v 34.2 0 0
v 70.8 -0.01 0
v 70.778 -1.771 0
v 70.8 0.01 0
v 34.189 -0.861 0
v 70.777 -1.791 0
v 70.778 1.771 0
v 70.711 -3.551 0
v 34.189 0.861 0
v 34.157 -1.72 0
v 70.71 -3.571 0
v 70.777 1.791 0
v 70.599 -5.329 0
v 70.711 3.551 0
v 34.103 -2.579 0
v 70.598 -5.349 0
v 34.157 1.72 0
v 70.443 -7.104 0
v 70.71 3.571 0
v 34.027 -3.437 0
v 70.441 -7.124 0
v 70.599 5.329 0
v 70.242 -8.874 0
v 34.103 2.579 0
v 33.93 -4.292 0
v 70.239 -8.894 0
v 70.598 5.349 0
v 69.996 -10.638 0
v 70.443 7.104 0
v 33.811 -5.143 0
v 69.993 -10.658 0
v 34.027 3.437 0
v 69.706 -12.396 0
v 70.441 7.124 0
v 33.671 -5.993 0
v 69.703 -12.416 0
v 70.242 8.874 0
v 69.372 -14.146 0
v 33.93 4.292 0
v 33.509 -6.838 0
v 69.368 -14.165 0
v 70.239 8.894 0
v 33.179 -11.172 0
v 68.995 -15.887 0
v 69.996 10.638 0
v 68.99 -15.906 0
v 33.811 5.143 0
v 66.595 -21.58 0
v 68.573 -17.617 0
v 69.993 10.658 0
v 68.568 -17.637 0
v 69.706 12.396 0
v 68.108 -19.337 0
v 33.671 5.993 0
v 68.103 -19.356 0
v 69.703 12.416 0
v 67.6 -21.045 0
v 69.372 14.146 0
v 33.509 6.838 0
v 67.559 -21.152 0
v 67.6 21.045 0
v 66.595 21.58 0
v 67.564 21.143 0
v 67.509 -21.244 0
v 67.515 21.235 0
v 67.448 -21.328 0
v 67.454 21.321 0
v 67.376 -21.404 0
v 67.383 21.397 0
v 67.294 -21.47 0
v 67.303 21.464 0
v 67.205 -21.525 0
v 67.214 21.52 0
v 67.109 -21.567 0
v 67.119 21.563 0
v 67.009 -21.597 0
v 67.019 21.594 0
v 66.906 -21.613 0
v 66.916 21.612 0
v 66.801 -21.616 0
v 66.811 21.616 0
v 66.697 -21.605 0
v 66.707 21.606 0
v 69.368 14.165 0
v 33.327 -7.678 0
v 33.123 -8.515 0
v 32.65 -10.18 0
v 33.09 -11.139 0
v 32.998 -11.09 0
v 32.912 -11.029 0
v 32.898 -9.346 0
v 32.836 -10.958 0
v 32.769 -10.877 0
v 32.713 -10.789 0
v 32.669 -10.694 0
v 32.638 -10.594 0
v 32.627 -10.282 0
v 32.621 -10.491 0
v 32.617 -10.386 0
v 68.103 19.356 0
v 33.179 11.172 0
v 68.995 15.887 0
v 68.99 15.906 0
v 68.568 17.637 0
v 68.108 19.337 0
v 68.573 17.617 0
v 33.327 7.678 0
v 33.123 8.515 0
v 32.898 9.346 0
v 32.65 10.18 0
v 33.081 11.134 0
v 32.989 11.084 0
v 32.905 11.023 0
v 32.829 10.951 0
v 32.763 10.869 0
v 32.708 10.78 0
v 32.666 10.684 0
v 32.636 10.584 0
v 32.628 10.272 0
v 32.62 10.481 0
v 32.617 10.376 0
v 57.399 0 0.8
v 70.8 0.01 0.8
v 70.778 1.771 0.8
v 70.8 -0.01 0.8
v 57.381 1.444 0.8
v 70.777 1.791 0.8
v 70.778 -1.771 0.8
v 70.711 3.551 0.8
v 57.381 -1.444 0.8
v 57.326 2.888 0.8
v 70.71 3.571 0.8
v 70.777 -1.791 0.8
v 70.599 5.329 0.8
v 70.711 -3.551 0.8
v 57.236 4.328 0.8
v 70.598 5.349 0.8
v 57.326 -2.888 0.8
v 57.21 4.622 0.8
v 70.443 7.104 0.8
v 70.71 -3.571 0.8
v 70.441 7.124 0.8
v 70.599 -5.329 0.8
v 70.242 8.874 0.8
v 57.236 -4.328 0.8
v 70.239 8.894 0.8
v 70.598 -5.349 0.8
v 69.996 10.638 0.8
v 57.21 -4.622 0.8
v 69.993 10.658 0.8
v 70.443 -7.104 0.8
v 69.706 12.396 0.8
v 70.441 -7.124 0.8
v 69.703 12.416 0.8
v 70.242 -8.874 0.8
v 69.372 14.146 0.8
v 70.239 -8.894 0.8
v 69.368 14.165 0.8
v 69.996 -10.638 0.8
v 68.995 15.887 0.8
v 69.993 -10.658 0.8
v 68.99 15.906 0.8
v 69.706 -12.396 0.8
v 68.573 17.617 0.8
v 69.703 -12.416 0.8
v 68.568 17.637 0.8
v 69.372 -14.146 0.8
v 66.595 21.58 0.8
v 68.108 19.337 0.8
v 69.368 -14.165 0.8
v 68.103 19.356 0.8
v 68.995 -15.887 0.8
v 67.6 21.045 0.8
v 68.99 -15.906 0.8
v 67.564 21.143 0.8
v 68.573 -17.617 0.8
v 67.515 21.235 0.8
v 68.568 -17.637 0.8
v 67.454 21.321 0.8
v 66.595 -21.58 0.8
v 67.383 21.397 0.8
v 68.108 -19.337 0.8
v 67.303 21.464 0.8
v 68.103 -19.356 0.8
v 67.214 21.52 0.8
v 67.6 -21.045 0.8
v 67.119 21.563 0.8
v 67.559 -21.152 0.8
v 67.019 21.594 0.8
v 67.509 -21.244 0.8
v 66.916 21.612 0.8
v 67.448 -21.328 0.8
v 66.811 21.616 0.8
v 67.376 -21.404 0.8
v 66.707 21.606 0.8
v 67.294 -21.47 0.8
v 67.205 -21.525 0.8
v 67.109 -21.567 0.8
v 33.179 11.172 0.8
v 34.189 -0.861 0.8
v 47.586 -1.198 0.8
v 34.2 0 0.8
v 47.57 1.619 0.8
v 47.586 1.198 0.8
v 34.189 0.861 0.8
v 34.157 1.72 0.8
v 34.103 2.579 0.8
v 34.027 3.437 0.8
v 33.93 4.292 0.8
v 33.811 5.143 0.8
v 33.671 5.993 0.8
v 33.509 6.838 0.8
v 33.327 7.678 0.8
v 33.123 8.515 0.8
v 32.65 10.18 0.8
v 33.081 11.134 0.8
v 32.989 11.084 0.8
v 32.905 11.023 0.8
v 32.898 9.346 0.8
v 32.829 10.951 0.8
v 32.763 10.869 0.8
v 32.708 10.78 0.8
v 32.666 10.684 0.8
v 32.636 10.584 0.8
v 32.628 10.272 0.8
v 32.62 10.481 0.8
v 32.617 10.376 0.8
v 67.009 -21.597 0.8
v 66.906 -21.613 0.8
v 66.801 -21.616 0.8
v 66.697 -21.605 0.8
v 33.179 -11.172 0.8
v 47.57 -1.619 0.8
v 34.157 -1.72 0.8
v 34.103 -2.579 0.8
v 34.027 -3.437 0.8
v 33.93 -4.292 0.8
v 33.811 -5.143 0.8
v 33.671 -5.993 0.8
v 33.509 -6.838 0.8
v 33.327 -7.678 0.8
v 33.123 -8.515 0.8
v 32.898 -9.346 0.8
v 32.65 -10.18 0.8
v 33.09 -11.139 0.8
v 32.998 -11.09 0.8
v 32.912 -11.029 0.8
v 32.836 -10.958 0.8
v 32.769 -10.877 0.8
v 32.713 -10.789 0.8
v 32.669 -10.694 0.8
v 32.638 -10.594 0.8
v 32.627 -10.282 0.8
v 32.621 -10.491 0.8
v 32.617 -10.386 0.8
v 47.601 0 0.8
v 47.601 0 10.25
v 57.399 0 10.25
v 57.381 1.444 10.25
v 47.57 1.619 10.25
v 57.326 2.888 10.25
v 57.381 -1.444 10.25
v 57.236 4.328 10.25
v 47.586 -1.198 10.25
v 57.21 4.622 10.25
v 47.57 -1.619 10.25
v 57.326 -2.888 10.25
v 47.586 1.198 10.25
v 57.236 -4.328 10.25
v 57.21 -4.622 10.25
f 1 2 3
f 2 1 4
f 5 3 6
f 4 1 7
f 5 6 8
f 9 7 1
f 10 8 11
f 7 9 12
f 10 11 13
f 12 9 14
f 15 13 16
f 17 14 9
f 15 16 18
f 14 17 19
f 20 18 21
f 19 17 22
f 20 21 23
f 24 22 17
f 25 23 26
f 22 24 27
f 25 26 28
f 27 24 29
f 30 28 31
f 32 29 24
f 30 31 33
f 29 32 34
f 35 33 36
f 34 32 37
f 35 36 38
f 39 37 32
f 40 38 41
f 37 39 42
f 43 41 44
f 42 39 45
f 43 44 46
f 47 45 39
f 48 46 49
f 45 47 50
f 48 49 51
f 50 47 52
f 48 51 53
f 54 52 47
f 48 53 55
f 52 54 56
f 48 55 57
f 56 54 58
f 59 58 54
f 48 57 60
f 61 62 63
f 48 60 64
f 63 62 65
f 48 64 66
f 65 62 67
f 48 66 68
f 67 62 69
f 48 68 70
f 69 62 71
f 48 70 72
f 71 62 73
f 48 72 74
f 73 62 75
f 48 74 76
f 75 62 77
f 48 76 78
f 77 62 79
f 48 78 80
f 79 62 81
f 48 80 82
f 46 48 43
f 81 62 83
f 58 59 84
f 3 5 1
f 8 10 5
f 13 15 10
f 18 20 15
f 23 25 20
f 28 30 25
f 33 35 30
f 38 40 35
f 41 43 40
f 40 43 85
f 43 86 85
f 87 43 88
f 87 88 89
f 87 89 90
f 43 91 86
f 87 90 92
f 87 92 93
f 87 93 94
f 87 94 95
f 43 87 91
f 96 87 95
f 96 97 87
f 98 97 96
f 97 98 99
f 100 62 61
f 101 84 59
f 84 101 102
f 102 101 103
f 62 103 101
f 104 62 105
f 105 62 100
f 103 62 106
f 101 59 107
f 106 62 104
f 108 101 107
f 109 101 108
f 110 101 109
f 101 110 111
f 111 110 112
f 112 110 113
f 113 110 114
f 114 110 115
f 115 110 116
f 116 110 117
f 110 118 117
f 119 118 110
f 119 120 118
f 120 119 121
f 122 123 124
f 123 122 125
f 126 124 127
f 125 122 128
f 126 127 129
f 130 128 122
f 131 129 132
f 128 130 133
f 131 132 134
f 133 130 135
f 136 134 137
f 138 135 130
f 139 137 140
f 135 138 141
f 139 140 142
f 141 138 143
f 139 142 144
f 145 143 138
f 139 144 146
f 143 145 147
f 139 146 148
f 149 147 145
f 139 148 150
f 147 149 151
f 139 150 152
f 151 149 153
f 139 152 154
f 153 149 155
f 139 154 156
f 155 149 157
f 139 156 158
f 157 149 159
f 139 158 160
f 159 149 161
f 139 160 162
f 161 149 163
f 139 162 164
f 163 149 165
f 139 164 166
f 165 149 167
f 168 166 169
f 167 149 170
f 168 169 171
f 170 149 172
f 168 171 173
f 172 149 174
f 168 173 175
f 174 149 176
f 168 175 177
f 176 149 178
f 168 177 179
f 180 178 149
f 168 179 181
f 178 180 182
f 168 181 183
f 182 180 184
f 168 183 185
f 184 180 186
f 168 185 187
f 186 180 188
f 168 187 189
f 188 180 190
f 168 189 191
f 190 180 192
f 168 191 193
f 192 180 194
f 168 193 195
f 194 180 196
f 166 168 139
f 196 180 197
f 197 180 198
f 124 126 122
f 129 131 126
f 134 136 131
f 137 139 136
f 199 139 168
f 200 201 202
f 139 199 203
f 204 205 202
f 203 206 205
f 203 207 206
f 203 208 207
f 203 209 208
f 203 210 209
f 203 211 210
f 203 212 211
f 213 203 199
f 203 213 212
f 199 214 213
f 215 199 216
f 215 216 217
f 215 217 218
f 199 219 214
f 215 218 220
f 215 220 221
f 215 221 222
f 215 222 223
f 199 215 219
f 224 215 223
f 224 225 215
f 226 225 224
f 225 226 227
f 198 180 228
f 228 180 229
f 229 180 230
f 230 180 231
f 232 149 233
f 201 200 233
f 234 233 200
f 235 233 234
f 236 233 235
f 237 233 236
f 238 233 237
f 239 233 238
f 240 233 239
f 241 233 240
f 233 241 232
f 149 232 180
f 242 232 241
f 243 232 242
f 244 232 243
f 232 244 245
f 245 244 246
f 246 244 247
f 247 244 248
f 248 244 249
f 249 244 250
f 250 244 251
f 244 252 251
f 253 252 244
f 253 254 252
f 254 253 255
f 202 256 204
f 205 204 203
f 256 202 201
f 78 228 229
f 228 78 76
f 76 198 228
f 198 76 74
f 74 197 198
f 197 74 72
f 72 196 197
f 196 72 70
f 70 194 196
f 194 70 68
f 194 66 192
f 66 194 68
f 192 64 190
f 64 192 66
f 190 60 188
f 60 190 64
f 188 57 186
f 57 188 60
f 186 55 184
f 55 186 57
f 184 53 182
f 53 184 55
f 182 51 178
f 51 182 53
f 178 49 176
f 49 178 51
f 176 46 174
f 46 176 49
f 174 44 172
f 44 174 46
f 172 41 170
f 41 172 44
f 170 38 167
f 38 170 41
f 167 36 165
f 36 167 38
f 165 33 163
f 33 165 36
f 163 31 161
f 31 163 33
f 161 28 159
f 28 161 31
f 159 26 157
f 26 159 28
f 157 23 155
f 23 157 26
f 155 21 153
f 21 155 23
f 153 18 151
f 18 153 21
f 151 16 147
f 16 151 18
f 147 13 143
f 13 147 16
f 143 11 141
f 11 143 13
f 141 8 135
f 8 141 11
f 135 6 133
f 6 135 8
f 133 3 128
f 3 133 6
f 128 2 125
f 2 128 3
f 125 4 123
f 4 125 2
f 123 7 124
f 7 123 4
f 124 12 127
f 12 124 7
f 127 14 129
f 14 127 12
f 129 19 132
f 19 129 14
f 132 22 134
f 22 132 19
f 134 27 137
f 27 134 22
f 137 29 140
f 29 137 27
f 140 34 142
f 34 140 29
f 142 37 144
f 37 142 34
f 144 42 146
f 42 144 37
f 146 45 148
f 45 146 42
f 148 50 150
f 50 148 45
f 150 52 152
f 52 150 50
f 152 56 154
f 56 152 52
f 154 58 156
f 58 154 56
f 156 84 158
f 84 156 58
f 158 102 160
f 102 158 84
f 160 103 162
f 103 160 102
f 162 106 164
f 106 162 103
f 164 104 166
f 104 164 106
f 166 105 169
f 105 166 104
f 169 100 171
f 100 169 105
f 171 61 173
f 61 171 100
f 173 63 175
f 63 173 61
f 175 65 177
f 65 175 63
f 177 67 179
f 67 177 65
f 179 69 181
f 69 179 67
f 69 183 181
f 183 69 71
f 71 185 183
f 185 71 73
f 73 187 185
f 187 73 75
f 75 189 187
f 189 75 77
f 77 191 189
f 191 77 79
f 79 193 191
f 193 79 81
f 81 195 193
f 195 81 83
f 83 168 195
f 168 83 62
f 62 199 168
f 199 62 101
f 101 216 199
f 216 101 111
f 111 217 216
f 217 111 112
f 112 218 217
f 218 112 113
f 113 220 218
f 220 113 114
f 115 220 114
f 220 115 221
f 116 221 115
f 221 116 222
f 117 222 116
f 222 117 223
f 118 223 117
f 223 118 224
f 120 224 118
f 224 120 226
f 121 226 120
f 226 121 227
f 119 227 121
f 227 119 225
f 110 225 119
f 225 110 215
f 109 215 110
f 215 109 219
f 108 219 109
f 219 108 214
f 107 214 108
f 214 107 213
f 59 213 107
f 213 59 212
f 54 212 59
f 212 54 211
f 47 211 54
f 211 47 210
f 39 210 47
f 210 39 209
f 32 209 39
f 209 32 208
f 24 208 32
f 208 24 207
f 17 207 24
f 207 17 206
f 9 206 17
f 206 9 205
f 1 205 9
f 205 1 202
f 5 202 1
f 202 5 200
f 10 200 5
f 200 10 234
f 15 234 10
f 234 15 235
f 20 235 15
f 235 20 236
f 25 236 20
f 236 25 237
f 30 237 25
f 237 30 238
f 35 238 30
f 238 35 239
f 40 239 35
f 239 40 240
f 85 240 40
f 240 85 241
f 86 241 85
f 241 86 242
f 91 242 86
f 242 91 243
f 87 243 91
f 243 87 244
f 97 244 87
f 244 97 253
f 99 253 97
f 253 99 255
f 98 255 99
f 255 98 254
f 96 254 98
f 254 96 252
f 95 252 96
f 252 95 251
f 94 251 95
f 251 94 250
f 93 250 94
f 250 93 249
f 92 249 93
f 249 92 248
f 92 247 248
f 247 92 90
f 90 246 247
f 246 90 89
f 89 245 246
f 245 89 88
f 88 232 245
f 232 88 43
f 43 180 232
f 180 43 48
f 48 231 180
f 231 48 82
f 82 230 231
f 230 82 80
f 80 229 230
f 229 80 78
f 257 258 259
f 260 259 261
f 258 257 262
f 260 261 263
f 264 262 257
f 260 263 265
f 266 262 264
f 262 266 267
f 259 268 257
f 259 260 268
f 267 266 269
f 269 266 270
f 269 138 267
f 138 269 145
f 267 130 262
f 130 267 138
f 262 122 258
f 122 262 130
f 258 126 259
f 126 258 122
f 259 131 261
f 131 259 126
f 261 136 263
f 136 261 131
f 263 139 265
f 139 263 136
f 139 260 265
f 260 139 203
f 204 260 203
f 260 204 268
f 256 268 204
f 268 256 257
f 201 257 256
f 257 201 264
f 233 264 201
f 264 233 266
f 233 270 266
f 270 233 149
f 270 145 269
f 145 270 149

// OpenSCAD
// file: parameters.scad
// =============================================================================
// Gen-BQ — nightly 2026-10-07 (physics_scorer, honest magpylib watts)
// Smooth-torque 8-pole / 9-coil line (winding factor 0.945, much lower cogging than 6-coil) with tonight's gap levers: flush 5.00 mm through-pocket seat, 0.8 mm bobbin lip (wider 35–70 mm sectors) and a ±8 mm Ø5 map at R44/52/60, on the Gen-BN Ø138 × 4.76 mm steel. Improves Gen-BN 4.166 W but 9 coils still lose to 6 coils under the wire budget.
// Clocking 0 deg (magnets N facing S) + D-flat keyed bore + index notch + flip-symmetric hole map.
// Windable 2-piece bobbin; turns = physics_scorer turns_fit; copper only between flanges.
// Steel back-iron: 2× Ø138 × 4.76 mm (3/16") mild-steel discs (steel_backiron_disc.dxf); magnets sit ON the steel
// (through-pockets) -> score with --back-iron.
// =============================================================================
topology            = "dual_rotor";

// --- Wire / winding (physics_scorer winding-fit) -------------------------------
wire_awg            = 26;
wire_od             = 0.45;     // insulated OD mm (bare 0.405)
fill_realistic      = 0.65;     // insulated-wire area / window (DENSE layered wind with a jig; scorer cap 0.65)
turns               = 486;       // = physics_scorer turns_fit (do NOT raise)
coil_former_type    = "bobbin";
coil_core_inset     = 12.60;     // radial copper build: hub = copper boundary inset by this
wind_build_axial    = 0.0;      // nothing proud of the flanges
wind_build_radial   = 0.0;

// --- Bobbin (base + lid) ---------------------------------------------------------
coil_id_r           = 35.00;    // copper boundary sector
coil_od_r           = 70.00;
span_deg            = 34.6;    // = pitch - 2*asin((wall+0.85)/coil_id_r) -> >=1.2 mm stator web
former_web          = 9.45;     // copper height between flanges (TALL copper: steel keeps Bz up)
flange_t            = 0.80;     // >= 0.8 mm FDM wall rule (tall winds push on the flanges)
wall                = 0.80;     // flange lip beyond copper
former_bare_h       = former_web + 2 * flange_t;
coil_envelope_h     = former_bare_h + 2 * wind_build_axial;
tab_w               = 7.0;
tab_len             = 7.0;
tab_h               = former_bare_h / 2;
pin_d               = 1.9;      // 1.75 mm filament locating pin
coil_mount_r        = coil_od_r + 0.2 + 4.0;
lead_y              = 1.6;
lead_slot_w         = 0.9;
lead_groove_d       = 0.6;

// --- Gap -------------------------------------------------------------------------
run_clear           = 0.50;     // rotor face -> flange
gap_spacer_h        = run_clear + wind_build_axial;
m2m                 = coil_envelope_h + 2 * run_clear;   // rotor face to rotor face (= gap_sleeve length)

// --- Stator ----------------------------------------------------------------------
coil_stations       = 9;
bay_clear           = 0.25;
stator_thick        = former_bare_h;                        // bobbins flush both faces
stator_od           = 160.0;
shaft_clear_stator  = 14.0;     // stator is static; gap sleeve OD 12 spins inside

// --- Rotor(s) --------------------------------------------------------------------
magnet_Br           = 1.43;     // N52
magnet_d_large      = 20.0;
magnet_h_large      = 5.0;      // one O20x5 per pocket
magnet_h_small      = 5.0;      // one O5x5 per pocket
halbach_magnetisation = "diametric"; // O5x5 assist magnets MUST be DIAMETRICALLY magnetised (tangential)
rotor_b_same_axis   = true;     // same-index magnets share one axis: N faces S across the gap
large_pocket_d      = 20.3;
small_pocket_d      = 5.3;
pocket_h            = 5.00;     // THROUGH the carrier: magnet back face sits on the steel disc (FLUSH seat: carrier = magnet height, magnet face level with the rotor face)
large_n             = 8;
R_large             = 52.0;
R_small_inner       = 44.0;
R_small_mid         = 52.0;
R_small_outer       = 60.0;
small_r_list        = [R_small_inner, R_small_mid, R_small_outer];   // O5 pockets between poles
carrier_od          = 138.0;
carrier_thick       = pocket_h;
hub_h               = 12.0;     // > steel_t + insert: radial set-screw clears the steel
hub_od              = 24.0;     // slim hub so the M4 brace rods fit at R~18 inside the coil ring
hub_insert_d        = 4.0;      // M3 heat-set insert, radial, bears on the D-flat
rotor_b_offset_deg  = 0.0;      // CLOCKING: magnets directly opposite
shaft_key           = "dflat";
dflat_depth         = 0.5;      // 8 mm shaft with 0.5 mm flat (7.5 across flat)
index_notch_d       = 3.0;

// --- Steel back-iron (buyable laser-cut) -------------------------------------------
steel_t             = 4.76;      // mild steel thickness (image method ignores it; sized from steel_flux.py so the return path stays well below saturation)
steel_center_hole   = 26.0;     // slips over the rotor hub (OD 24)
steel_od            = carrier_od;   // steel disc OD = rotor carrier OD

// --- Modular MAX interface ----------------------------------------------------------
shaft_bore          = 8.35;
dflat_x             = 4.0 - dflat_depth + (shaft_bore - 8.0) / 2;
bearing_d           = 21.85;
bearing_h           = 7.2;
m3_clear            = 3.5;
bolt_r_inner        = 30.0;     // M3 steel-disc clamp bolts (inside the magnet ring)
bolt_n_inner        = 4;
bolt_inner_angles   = [0, 90, 180, 270];
bolt_r_outer        = 65.0;     // M3 steel-disc clamp bolts (outside the magnet ring)
bolt_outer_angles   = [45, 135, 225, 315];
flange_bolt_r       = 75.0;     // frame rods: OUTSIDE the rotor OD (rotors spin inside them)
flange_bolt_n       = 9;
flange_bolt_offset  = 20.00;    // between coil stations -> never cuts a lead groove/tab
brace_r             = 18.0;
brace_d             = 4.3;      // temporary M4 jack rods (assembly only)
brace_n             = 4;
brace_angles        = [45, 135, 225, 315];          // flip-symmetric

spacer_pad_od       = 14.0;
spacer_pad_id       = m3_clear;
endbell_od          = 160.0;
endbell_thick       = 8.0;
endbell_shaft_clear = 10.0;
collar_h            = 10.0;
standoff_od         = 9.0;
frame_standoff_h    = run_clear + carrier_thick + hub_h + collar_h + 2.0;
sleeve_od           = 12.0;
plate_max_mm        = 410;

$fn = 64;
// main file
// Gen-BQ — bobbin BASE (bottom flange + hub). Print x9, flange down. Wind 26 AWG x 486 t around
// the hub with the LID glued on (coil_lid.stl). Copper lives ONLY between the flanges (no proud winds).
include <parameters.scad>;
$fn = 48;
module sector_2d(r_in, r_out, ang) {
    polygon([
        for (a = [-ang/2 : ang/24 : ang/2]) [r_in*cos(a), r_in*sin(a)],
        for (a = [ang/2 : -ang/24 : -ang/2]) [r_out*cos(a), r_out*sin(a)]
    ]);
}
module footprint_2d() { offset(r=wall) sector_2d(coil_id_r, coil_od_r, span_deg); }
module hub_2d()       { offset(delta=-coil_core_inset) sector_2d(coil_id_r, coil_od_r, span_deg); }

union() {
    linear_extrude(flange_t) footprint_2d();
    translate([0, 0, flange_t - 0.01]) linear_extrude(former_web + 0.01) hub_2d();
}
